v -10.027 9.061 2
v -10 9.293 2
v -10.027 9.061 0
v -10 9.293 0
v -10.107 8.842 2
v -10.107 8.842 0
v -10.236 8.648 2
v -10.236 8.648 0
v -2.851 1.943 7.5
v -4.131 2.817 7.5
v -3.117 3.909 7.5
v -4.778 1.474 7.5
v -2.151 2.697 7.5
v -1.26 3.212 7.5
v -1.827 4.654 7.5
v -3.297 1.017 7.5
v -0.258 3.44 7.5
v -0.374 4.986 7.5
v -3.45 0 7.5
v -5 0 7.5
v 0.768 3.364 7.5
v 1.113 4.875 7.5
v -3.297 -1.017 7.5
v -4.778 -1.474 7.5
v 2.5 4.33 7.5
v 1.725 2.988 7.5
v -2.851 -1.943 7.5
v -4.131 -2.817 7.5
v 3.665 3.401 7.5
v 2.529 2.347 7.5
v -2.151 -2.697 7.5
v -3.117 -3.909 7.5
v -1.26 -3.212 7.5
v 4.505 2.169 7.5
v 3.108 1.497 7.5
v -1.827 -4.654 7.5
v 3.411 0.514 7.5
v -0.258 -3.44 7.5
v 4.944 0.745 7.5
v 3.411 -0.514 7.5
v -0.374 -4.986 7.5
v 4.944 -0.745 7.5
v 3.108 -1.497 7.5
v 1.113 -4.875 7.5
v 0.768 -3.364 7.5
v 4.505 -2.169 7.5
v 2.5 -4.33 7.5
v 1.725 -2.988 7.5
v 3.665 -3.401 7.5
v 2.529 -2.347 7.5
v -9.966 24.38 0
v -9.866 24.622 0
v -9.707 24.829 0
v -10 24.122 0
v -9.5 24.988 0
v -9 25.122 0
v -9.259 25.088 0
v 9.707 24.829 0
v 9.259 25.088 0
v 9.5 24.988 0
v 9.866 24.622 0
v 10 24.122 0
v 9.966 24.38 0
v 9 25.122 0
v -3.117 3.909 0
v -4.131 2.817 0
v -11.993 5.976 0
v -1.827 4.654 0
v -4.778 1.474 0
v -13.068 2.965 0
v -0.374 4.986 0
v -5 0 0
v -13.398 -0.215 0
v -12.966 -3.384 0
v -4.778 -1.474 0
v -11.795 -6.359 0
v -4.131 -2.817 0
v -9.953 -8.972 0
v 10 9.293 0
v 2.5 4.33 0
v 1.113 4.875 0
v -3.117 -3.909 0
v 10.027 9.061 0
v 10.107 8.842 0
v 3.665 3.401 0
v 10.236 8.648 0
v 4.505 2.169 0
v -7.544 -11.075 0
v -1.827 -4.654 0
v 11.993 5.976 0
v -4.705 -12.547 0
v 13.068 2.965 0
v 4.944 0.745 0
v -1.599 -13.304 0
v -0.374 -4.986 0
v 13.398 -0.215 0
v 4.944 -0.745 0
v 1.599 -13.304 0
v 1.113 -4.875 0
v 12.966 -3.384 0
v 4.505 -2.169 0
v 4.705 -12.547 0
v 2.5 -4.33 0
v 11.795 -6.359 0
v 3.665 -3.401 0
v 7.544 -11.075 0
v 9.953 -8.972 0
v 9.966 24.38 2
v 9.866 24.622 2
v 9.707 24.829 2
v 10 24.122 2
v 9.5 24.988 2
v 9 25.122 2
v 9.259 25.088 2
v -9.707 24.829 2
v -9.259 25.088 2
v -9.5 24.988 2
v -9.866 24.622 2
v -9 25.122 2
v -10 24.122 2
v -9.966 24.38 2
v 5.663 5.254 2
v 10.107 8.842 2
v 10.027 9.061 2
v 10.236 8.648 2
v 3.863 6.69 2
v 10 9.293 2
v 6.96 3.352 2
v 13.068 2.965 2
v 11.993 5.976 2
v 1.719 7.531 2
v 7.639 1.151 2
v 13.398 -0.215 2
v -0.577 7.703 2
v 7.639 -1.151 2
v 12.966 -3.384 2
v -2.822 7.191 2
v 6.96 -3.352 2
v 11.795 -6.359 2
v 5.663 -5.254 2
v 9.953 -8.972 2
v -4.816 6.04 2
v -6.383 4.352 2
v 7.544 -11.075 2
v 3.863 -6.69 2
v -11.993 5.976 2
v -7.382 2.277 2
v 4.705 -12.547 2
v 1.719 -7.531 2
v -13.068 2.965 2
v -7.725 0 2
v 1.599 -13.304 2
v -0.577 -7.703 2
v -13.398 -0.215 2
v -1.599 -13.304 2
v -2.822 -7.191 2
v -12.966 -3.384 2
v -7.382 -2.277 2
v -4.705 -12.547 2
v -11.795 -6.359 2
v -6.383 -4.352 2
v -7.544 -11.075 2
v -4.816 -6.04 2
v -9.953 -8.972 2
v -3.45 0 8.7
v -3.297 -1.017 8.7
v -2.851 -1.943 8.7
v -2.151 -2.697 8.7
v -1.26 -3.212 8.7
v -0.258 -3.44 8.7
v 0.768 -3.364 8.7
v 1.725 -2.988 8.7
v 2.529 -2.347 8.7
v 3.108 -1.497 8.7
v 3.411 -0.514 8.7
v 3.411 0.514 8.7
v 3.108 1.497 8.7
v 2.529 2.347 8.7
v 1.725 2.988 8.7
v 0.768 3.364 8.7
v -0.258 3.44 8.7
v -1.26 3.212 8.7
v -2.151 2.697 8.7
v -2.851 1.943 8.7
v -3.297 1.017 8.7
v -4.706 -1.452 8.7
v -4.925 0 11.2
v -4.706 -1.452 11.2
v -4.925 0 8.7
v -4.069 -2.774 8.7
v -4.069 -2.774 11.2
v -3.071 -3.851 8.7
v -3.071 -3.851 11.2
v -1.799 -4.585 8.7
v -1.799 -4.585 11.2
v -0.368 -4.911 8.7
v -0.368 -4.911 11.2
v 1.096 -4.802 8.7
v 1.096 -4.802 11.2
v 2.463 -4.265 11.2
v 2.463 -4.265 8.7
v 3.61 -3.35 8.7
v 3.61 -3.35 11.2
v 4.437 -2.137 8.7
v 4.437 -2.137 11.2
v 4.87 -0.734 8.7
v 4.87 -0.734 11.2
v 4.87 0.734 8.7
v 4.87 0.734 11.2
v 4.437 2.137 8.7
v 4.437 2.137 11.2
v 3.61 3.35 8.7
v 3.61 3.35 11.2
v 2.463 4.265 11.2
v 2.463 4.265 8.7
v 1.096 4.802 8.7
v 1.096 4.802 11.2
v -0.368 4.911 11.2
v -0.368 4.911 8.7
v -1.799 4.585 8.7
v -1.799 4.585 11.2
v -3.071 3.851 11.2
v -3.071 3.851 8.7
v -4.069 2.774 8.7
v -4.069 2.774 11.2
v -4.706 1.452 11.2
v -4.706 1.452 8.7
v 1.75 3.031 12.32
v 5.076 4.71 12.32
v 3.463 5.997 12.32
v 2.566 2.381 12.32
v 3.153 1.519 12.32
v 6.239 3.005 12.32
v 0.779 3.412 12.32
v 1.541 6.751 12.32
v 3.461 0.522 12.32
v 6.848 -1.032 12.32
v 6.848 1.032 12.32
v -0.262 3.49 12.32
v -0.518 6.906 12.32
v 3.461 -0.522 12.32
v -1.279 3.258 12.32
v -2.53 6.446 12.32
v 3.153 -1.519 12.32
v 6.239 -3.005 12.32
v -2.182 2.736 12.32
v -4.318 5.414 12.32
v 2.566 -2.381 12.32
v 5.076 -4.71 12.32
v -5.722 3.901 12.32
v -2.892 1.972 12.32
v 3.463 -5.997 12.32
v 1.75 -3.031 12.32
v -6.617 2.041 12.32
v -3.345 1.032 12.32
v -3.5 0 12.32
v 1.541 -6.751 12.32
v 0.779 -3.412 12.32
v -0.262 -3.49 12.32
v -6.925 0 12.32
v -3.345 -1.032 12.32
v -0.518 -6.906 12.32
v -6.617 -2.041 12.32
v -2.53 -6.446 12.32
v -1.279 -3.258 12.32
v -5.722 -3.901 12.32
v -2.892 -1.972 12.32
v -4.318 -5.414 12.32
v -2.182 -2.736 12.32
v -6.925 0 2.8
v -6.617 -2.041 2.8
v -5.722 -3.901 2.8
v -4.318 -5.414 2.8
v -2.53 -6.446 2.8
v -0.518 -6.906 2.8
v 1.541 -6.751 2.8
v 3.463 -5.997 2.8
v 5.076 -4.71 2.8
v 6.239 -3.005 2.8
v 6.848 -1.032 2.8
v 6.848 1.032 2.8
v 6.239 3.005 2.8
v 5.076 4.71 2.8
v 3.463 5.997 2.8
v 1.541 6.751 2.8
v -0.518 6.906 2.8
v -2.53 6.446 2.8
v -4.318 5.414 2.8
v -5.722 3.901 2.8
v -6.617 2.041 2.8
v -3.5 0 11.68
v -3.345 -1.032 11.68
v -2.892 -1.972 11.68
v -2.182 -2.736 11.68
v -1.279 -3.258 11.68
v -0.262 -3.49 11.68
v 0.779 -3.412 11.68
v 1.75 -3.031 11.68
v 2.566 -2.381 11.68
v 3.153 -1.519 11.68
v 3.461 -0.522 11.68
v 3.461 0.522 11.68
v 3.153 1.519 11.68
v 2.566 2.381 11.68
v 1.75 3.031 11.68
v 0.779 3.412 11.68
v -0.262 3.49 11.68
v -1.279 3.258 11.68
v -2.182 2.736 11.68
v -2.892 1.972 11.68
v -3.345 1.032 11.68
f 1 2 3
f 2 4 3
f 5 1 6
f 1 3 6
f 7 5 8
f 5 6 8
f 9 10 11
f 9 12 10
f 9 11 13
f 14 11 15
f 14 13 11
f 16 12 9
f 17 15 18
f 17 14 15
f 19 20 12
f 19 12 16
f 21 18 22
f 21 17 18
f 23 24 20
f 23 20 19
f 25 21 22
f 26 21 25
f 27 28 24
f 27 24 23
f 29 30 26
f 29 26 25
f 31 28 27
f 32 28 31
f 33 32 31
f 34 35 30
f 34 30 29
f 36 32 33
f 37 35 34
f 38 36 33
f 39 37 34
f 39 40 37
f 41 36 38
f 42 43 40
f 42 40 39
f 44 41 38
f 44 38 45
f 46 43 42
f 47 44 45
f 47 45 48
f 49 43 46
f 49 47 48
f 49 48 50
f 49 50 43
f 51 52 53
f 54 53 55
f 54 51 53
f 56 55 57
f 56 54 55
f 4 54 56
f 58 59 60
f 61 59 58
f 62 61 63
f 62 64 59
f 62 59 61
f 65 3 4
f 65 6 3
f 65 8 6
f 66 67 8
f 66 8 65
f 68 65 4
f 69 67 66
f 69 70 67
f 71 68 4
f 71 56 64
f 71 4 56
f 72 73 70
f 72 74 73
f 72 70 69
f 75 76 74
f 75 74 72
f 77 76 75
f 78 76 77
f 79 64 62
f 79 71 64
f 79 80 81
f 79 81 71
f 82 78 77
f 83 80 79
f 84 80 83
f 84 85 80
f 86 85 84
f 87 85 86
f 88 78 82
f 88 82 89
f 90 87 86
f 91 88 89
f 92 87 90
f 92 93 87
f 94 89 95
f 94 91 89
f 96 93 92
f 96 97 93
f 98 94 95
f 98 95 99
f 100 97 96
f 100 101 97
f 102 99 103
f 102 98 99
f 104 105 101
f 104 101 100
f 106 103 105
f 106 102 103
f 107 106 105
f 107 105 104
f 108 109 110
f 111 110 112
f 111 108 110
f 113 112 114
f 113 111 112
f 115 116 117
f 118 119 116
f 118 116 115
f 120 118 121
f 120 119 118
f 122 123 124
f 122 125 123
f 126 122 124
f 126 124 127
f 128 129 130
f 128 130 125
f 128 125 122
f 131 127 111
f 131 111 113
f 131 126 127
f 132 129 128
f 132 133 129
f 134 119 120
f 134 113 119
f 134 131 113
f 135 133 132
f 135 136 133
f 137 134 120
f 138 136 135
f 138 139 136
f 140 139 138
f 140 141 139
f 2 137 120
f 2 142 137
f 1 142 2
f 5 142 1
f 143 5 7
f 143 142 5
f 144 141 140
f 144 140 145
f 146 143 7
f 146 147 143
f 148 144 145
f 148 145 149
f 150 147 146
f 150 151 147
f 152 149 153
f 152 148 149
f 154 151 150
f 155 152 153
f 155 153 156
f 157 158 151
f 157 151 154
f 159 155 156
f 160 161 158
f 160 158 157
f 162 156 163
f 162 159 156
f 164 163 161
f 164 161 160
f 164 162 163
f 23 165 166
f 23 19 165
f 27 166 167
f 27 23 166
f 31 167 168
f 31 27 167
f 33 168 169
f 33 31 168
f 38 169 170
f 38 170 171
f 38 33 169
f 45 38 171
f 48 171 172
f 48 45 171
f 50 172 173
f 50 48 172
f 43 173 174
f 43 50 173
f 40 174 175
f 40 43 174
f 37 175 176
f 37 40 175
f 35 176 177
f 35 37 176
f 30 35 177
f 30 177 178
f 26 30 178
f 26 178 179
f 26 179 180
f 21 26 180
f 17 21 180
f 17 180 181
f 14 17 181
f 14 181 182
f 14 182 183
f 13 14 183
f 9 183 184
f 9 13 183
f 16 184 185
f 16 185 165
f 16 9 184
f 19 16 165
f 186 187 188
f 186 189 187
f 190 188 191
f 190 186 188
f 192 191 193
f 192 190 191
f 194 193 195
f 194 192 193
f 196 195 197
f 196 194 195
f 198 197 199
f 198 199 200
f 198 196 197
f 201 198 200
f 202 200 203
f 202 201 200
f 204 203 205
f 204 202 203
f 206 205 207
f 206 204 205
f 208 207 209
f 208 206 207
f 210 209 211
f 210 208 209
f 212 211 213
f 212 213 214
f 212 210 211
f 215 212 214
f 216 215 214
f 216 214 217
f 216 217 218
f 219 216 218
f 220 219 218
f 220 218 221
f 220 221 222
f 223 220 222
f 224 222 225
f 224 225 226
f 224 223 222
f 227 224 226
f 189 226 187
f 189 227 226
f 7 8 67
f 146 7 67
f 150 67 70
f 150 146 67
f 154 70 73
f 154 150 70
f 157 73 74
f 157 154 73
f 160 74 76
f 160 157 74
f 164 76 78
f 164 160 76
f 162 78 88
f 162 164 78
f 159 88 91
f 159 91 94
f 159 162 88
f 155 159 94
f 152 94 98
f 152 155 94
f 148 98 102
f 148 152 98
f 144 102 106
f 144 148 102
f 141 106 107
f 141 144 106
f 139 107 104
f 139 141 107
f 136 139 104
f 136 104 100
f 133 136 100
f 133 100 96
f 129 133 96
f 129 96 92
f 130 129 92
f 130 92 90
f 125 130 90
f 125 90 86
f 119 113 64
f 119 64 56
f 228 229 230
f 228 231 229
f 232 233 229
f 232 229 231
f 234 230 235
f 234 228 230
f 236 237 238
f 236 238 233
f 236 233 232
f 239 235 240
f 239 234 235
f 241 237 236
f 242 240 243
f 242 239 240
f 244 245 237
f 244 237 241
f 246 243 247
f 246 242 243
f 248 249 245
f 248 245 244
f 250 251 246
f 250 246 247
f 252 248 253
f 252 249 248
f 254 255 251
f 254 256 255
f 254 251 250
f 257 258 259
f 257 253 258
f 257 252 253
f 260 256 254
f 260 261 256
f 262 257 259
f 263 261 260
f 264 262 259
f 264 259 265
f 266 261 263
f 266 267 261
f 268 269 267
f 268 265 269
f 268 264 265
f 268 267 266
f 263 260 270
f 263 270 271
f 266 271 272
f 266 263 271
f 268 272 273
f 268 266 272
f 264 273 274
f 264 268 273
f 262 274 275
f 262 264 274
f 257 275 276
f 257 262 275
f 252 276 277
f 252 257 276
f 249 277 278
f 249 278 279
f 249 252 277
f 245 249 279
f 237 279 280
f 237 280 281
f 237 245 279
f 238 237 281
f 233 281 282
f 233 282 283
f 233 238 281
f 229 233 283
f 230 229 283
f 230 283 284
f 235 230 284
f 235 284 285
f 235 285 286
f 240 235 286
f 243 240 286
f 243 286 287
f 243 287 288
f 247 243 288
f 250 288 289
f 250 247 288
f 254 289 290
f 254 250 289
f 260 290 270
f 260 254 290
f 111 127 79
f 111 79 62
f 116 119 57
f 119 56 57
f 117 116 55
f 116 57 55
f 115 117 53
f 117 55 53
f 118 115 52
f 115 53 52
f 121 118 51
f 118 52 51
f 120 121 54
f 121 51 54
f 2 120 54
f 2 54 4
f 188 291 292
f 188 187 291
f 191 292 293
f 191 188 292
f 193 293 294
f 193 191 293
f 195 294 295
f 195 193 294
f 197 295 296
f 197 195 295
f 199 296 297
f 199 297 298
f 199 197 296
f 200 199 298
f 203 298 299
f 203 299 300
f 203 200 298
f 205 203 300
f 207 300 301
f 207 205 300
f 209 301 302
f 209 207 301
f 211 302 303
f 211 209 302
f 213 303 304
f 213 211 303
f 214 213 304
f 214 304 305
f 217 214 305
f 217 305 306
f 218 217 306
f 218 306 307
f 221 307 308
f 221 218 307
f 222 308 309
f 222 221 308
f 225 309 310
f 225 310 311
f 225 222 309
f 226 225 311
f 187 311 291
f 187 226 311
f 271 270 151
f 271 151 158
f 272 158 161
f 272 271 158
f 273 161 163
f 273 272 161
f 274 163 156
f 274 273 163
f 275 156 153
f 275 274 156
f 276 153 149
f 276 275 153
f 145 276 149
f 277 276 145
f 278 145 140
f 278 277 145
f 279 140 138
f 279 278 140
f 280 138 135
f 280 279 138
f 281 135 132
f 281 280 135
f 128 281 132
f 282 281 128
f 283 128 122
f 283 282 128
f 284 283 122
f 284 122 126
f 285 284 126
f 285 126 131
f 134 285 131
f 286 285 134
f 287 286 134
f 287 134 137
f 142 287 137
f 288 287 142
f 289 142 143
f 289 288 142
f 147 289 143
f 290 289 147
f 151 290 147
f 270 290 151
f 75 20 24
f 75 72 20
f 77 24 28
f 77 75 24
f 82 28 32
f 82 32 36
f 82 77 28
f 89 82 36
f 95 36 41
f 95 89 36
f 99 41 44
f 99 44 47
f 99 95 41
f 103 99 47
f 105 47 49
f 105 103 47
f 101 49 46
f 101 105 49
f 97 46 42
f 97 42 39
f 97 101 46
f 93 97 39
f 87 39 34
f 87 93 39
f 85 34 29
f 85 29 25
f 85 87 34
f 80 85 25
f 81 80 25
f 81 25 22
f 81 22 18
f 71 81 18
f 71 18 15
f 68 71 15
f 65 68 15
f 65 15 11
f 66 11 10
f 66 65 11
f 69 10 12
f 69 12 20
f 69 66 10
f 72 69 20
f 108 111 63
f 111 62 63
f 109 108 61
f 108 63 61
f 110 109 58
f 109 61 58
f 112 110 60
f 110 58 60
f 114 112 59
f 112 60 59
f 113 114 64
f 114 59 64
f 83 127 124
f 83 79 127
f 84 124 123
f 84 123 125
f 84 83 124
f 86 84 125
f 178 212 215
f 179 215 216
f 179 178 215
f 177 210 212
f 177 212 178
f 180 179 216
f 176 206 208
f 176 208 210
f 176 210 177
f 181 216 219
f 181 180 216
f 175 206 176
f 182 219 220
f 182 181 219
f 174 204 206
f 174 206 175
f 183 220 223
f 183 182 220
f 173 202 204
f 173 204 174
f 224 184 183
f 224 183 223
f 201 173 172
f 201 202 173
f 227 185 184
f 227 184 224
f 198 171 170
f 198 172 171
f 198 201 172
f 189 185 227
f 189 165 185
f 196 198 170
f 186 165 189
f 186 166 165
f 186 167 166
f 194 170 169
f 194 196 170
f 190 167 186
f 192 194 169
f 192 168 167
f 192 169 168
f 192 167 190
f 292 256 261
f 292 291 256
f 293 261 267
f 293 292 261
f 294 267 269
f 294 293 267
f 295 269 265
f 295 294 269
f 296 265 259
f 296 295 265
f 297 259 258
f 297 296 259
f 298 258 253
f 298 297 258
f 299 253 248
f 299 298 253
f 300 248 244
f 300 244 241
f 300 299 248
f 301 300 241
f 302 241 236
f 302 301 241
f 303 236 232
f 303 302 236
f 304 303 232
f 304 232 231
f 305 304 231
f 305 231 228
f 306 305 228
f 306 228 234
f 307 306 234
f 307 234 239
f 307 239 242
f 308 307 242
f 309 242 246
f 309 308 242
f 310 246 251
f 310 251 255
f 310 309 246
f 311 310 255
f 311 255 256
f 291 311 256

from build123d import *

# Parameters (mm, degrees)
BOSS_EXTRUDE1_DEPTH = 2
FILLET2_R           = 1
CHAMFER1_SIZE       = 0.8


with BuildPart() as part:
    # Sketch2 → Revolve1 (revolve)
    with BuildSketch(Plane(origin=(0, 0, 0), x_dir=(1, 0, 0), z_dir=(0, 1, 0))):
        Polygon((-3.5, -12.32), (-3.5, -11.68), (-4.925, -11.2), (-4.925, -8.7), (-3.45, -8.7), (-3.45, -7.5), (-5, -7.5), (-5, 0), (-13.4, 0), (-13.4, -2), (-6.925, -2), (-6.925, -12.32), align=None)
    revolve(axis=Axis((0, 0, 0), (0, 0, 1)))

    # Sketch3 → Boss-Extrude1 (add)
    with BuildSketch(Plane.XY.offset(2)):
        with BuildLine():
            Line((10, 8.919641248), (10, 25.121576202))
            Line((10, 25.121576202), (-10, 25.121576202))
            Line((-10, 25.121576202), (-10, 8.919641248))
            ThreePointArc((-10, 8.919641248), (0, 13.4), (10, 8.919641248))
        make_face()
    extrude(amount=-BOSS_EXTRUDE1_DEPTH)

    # Fillet2
    fillet2_edges = [part.edges().sort_by_distance(p)[0] for p in [
        (10, 25.121576202, 1),
        (-10, 25.121576202, 1),
        (-10, 8.919641248, 1),
        (10, 8.919641248, 1),
    ]]
    fillet(fillet2_edges, radius=FILLET2_R)

    # Chamfer1
    chamfer1_edges = [part.edges().sort_by_distance(p)[0] for p in [
        (6.925, 0, 2),
    ]]
    chamfer(chamfer1_edges, length=CHAMFER1_SIZE)


solid = part.part
